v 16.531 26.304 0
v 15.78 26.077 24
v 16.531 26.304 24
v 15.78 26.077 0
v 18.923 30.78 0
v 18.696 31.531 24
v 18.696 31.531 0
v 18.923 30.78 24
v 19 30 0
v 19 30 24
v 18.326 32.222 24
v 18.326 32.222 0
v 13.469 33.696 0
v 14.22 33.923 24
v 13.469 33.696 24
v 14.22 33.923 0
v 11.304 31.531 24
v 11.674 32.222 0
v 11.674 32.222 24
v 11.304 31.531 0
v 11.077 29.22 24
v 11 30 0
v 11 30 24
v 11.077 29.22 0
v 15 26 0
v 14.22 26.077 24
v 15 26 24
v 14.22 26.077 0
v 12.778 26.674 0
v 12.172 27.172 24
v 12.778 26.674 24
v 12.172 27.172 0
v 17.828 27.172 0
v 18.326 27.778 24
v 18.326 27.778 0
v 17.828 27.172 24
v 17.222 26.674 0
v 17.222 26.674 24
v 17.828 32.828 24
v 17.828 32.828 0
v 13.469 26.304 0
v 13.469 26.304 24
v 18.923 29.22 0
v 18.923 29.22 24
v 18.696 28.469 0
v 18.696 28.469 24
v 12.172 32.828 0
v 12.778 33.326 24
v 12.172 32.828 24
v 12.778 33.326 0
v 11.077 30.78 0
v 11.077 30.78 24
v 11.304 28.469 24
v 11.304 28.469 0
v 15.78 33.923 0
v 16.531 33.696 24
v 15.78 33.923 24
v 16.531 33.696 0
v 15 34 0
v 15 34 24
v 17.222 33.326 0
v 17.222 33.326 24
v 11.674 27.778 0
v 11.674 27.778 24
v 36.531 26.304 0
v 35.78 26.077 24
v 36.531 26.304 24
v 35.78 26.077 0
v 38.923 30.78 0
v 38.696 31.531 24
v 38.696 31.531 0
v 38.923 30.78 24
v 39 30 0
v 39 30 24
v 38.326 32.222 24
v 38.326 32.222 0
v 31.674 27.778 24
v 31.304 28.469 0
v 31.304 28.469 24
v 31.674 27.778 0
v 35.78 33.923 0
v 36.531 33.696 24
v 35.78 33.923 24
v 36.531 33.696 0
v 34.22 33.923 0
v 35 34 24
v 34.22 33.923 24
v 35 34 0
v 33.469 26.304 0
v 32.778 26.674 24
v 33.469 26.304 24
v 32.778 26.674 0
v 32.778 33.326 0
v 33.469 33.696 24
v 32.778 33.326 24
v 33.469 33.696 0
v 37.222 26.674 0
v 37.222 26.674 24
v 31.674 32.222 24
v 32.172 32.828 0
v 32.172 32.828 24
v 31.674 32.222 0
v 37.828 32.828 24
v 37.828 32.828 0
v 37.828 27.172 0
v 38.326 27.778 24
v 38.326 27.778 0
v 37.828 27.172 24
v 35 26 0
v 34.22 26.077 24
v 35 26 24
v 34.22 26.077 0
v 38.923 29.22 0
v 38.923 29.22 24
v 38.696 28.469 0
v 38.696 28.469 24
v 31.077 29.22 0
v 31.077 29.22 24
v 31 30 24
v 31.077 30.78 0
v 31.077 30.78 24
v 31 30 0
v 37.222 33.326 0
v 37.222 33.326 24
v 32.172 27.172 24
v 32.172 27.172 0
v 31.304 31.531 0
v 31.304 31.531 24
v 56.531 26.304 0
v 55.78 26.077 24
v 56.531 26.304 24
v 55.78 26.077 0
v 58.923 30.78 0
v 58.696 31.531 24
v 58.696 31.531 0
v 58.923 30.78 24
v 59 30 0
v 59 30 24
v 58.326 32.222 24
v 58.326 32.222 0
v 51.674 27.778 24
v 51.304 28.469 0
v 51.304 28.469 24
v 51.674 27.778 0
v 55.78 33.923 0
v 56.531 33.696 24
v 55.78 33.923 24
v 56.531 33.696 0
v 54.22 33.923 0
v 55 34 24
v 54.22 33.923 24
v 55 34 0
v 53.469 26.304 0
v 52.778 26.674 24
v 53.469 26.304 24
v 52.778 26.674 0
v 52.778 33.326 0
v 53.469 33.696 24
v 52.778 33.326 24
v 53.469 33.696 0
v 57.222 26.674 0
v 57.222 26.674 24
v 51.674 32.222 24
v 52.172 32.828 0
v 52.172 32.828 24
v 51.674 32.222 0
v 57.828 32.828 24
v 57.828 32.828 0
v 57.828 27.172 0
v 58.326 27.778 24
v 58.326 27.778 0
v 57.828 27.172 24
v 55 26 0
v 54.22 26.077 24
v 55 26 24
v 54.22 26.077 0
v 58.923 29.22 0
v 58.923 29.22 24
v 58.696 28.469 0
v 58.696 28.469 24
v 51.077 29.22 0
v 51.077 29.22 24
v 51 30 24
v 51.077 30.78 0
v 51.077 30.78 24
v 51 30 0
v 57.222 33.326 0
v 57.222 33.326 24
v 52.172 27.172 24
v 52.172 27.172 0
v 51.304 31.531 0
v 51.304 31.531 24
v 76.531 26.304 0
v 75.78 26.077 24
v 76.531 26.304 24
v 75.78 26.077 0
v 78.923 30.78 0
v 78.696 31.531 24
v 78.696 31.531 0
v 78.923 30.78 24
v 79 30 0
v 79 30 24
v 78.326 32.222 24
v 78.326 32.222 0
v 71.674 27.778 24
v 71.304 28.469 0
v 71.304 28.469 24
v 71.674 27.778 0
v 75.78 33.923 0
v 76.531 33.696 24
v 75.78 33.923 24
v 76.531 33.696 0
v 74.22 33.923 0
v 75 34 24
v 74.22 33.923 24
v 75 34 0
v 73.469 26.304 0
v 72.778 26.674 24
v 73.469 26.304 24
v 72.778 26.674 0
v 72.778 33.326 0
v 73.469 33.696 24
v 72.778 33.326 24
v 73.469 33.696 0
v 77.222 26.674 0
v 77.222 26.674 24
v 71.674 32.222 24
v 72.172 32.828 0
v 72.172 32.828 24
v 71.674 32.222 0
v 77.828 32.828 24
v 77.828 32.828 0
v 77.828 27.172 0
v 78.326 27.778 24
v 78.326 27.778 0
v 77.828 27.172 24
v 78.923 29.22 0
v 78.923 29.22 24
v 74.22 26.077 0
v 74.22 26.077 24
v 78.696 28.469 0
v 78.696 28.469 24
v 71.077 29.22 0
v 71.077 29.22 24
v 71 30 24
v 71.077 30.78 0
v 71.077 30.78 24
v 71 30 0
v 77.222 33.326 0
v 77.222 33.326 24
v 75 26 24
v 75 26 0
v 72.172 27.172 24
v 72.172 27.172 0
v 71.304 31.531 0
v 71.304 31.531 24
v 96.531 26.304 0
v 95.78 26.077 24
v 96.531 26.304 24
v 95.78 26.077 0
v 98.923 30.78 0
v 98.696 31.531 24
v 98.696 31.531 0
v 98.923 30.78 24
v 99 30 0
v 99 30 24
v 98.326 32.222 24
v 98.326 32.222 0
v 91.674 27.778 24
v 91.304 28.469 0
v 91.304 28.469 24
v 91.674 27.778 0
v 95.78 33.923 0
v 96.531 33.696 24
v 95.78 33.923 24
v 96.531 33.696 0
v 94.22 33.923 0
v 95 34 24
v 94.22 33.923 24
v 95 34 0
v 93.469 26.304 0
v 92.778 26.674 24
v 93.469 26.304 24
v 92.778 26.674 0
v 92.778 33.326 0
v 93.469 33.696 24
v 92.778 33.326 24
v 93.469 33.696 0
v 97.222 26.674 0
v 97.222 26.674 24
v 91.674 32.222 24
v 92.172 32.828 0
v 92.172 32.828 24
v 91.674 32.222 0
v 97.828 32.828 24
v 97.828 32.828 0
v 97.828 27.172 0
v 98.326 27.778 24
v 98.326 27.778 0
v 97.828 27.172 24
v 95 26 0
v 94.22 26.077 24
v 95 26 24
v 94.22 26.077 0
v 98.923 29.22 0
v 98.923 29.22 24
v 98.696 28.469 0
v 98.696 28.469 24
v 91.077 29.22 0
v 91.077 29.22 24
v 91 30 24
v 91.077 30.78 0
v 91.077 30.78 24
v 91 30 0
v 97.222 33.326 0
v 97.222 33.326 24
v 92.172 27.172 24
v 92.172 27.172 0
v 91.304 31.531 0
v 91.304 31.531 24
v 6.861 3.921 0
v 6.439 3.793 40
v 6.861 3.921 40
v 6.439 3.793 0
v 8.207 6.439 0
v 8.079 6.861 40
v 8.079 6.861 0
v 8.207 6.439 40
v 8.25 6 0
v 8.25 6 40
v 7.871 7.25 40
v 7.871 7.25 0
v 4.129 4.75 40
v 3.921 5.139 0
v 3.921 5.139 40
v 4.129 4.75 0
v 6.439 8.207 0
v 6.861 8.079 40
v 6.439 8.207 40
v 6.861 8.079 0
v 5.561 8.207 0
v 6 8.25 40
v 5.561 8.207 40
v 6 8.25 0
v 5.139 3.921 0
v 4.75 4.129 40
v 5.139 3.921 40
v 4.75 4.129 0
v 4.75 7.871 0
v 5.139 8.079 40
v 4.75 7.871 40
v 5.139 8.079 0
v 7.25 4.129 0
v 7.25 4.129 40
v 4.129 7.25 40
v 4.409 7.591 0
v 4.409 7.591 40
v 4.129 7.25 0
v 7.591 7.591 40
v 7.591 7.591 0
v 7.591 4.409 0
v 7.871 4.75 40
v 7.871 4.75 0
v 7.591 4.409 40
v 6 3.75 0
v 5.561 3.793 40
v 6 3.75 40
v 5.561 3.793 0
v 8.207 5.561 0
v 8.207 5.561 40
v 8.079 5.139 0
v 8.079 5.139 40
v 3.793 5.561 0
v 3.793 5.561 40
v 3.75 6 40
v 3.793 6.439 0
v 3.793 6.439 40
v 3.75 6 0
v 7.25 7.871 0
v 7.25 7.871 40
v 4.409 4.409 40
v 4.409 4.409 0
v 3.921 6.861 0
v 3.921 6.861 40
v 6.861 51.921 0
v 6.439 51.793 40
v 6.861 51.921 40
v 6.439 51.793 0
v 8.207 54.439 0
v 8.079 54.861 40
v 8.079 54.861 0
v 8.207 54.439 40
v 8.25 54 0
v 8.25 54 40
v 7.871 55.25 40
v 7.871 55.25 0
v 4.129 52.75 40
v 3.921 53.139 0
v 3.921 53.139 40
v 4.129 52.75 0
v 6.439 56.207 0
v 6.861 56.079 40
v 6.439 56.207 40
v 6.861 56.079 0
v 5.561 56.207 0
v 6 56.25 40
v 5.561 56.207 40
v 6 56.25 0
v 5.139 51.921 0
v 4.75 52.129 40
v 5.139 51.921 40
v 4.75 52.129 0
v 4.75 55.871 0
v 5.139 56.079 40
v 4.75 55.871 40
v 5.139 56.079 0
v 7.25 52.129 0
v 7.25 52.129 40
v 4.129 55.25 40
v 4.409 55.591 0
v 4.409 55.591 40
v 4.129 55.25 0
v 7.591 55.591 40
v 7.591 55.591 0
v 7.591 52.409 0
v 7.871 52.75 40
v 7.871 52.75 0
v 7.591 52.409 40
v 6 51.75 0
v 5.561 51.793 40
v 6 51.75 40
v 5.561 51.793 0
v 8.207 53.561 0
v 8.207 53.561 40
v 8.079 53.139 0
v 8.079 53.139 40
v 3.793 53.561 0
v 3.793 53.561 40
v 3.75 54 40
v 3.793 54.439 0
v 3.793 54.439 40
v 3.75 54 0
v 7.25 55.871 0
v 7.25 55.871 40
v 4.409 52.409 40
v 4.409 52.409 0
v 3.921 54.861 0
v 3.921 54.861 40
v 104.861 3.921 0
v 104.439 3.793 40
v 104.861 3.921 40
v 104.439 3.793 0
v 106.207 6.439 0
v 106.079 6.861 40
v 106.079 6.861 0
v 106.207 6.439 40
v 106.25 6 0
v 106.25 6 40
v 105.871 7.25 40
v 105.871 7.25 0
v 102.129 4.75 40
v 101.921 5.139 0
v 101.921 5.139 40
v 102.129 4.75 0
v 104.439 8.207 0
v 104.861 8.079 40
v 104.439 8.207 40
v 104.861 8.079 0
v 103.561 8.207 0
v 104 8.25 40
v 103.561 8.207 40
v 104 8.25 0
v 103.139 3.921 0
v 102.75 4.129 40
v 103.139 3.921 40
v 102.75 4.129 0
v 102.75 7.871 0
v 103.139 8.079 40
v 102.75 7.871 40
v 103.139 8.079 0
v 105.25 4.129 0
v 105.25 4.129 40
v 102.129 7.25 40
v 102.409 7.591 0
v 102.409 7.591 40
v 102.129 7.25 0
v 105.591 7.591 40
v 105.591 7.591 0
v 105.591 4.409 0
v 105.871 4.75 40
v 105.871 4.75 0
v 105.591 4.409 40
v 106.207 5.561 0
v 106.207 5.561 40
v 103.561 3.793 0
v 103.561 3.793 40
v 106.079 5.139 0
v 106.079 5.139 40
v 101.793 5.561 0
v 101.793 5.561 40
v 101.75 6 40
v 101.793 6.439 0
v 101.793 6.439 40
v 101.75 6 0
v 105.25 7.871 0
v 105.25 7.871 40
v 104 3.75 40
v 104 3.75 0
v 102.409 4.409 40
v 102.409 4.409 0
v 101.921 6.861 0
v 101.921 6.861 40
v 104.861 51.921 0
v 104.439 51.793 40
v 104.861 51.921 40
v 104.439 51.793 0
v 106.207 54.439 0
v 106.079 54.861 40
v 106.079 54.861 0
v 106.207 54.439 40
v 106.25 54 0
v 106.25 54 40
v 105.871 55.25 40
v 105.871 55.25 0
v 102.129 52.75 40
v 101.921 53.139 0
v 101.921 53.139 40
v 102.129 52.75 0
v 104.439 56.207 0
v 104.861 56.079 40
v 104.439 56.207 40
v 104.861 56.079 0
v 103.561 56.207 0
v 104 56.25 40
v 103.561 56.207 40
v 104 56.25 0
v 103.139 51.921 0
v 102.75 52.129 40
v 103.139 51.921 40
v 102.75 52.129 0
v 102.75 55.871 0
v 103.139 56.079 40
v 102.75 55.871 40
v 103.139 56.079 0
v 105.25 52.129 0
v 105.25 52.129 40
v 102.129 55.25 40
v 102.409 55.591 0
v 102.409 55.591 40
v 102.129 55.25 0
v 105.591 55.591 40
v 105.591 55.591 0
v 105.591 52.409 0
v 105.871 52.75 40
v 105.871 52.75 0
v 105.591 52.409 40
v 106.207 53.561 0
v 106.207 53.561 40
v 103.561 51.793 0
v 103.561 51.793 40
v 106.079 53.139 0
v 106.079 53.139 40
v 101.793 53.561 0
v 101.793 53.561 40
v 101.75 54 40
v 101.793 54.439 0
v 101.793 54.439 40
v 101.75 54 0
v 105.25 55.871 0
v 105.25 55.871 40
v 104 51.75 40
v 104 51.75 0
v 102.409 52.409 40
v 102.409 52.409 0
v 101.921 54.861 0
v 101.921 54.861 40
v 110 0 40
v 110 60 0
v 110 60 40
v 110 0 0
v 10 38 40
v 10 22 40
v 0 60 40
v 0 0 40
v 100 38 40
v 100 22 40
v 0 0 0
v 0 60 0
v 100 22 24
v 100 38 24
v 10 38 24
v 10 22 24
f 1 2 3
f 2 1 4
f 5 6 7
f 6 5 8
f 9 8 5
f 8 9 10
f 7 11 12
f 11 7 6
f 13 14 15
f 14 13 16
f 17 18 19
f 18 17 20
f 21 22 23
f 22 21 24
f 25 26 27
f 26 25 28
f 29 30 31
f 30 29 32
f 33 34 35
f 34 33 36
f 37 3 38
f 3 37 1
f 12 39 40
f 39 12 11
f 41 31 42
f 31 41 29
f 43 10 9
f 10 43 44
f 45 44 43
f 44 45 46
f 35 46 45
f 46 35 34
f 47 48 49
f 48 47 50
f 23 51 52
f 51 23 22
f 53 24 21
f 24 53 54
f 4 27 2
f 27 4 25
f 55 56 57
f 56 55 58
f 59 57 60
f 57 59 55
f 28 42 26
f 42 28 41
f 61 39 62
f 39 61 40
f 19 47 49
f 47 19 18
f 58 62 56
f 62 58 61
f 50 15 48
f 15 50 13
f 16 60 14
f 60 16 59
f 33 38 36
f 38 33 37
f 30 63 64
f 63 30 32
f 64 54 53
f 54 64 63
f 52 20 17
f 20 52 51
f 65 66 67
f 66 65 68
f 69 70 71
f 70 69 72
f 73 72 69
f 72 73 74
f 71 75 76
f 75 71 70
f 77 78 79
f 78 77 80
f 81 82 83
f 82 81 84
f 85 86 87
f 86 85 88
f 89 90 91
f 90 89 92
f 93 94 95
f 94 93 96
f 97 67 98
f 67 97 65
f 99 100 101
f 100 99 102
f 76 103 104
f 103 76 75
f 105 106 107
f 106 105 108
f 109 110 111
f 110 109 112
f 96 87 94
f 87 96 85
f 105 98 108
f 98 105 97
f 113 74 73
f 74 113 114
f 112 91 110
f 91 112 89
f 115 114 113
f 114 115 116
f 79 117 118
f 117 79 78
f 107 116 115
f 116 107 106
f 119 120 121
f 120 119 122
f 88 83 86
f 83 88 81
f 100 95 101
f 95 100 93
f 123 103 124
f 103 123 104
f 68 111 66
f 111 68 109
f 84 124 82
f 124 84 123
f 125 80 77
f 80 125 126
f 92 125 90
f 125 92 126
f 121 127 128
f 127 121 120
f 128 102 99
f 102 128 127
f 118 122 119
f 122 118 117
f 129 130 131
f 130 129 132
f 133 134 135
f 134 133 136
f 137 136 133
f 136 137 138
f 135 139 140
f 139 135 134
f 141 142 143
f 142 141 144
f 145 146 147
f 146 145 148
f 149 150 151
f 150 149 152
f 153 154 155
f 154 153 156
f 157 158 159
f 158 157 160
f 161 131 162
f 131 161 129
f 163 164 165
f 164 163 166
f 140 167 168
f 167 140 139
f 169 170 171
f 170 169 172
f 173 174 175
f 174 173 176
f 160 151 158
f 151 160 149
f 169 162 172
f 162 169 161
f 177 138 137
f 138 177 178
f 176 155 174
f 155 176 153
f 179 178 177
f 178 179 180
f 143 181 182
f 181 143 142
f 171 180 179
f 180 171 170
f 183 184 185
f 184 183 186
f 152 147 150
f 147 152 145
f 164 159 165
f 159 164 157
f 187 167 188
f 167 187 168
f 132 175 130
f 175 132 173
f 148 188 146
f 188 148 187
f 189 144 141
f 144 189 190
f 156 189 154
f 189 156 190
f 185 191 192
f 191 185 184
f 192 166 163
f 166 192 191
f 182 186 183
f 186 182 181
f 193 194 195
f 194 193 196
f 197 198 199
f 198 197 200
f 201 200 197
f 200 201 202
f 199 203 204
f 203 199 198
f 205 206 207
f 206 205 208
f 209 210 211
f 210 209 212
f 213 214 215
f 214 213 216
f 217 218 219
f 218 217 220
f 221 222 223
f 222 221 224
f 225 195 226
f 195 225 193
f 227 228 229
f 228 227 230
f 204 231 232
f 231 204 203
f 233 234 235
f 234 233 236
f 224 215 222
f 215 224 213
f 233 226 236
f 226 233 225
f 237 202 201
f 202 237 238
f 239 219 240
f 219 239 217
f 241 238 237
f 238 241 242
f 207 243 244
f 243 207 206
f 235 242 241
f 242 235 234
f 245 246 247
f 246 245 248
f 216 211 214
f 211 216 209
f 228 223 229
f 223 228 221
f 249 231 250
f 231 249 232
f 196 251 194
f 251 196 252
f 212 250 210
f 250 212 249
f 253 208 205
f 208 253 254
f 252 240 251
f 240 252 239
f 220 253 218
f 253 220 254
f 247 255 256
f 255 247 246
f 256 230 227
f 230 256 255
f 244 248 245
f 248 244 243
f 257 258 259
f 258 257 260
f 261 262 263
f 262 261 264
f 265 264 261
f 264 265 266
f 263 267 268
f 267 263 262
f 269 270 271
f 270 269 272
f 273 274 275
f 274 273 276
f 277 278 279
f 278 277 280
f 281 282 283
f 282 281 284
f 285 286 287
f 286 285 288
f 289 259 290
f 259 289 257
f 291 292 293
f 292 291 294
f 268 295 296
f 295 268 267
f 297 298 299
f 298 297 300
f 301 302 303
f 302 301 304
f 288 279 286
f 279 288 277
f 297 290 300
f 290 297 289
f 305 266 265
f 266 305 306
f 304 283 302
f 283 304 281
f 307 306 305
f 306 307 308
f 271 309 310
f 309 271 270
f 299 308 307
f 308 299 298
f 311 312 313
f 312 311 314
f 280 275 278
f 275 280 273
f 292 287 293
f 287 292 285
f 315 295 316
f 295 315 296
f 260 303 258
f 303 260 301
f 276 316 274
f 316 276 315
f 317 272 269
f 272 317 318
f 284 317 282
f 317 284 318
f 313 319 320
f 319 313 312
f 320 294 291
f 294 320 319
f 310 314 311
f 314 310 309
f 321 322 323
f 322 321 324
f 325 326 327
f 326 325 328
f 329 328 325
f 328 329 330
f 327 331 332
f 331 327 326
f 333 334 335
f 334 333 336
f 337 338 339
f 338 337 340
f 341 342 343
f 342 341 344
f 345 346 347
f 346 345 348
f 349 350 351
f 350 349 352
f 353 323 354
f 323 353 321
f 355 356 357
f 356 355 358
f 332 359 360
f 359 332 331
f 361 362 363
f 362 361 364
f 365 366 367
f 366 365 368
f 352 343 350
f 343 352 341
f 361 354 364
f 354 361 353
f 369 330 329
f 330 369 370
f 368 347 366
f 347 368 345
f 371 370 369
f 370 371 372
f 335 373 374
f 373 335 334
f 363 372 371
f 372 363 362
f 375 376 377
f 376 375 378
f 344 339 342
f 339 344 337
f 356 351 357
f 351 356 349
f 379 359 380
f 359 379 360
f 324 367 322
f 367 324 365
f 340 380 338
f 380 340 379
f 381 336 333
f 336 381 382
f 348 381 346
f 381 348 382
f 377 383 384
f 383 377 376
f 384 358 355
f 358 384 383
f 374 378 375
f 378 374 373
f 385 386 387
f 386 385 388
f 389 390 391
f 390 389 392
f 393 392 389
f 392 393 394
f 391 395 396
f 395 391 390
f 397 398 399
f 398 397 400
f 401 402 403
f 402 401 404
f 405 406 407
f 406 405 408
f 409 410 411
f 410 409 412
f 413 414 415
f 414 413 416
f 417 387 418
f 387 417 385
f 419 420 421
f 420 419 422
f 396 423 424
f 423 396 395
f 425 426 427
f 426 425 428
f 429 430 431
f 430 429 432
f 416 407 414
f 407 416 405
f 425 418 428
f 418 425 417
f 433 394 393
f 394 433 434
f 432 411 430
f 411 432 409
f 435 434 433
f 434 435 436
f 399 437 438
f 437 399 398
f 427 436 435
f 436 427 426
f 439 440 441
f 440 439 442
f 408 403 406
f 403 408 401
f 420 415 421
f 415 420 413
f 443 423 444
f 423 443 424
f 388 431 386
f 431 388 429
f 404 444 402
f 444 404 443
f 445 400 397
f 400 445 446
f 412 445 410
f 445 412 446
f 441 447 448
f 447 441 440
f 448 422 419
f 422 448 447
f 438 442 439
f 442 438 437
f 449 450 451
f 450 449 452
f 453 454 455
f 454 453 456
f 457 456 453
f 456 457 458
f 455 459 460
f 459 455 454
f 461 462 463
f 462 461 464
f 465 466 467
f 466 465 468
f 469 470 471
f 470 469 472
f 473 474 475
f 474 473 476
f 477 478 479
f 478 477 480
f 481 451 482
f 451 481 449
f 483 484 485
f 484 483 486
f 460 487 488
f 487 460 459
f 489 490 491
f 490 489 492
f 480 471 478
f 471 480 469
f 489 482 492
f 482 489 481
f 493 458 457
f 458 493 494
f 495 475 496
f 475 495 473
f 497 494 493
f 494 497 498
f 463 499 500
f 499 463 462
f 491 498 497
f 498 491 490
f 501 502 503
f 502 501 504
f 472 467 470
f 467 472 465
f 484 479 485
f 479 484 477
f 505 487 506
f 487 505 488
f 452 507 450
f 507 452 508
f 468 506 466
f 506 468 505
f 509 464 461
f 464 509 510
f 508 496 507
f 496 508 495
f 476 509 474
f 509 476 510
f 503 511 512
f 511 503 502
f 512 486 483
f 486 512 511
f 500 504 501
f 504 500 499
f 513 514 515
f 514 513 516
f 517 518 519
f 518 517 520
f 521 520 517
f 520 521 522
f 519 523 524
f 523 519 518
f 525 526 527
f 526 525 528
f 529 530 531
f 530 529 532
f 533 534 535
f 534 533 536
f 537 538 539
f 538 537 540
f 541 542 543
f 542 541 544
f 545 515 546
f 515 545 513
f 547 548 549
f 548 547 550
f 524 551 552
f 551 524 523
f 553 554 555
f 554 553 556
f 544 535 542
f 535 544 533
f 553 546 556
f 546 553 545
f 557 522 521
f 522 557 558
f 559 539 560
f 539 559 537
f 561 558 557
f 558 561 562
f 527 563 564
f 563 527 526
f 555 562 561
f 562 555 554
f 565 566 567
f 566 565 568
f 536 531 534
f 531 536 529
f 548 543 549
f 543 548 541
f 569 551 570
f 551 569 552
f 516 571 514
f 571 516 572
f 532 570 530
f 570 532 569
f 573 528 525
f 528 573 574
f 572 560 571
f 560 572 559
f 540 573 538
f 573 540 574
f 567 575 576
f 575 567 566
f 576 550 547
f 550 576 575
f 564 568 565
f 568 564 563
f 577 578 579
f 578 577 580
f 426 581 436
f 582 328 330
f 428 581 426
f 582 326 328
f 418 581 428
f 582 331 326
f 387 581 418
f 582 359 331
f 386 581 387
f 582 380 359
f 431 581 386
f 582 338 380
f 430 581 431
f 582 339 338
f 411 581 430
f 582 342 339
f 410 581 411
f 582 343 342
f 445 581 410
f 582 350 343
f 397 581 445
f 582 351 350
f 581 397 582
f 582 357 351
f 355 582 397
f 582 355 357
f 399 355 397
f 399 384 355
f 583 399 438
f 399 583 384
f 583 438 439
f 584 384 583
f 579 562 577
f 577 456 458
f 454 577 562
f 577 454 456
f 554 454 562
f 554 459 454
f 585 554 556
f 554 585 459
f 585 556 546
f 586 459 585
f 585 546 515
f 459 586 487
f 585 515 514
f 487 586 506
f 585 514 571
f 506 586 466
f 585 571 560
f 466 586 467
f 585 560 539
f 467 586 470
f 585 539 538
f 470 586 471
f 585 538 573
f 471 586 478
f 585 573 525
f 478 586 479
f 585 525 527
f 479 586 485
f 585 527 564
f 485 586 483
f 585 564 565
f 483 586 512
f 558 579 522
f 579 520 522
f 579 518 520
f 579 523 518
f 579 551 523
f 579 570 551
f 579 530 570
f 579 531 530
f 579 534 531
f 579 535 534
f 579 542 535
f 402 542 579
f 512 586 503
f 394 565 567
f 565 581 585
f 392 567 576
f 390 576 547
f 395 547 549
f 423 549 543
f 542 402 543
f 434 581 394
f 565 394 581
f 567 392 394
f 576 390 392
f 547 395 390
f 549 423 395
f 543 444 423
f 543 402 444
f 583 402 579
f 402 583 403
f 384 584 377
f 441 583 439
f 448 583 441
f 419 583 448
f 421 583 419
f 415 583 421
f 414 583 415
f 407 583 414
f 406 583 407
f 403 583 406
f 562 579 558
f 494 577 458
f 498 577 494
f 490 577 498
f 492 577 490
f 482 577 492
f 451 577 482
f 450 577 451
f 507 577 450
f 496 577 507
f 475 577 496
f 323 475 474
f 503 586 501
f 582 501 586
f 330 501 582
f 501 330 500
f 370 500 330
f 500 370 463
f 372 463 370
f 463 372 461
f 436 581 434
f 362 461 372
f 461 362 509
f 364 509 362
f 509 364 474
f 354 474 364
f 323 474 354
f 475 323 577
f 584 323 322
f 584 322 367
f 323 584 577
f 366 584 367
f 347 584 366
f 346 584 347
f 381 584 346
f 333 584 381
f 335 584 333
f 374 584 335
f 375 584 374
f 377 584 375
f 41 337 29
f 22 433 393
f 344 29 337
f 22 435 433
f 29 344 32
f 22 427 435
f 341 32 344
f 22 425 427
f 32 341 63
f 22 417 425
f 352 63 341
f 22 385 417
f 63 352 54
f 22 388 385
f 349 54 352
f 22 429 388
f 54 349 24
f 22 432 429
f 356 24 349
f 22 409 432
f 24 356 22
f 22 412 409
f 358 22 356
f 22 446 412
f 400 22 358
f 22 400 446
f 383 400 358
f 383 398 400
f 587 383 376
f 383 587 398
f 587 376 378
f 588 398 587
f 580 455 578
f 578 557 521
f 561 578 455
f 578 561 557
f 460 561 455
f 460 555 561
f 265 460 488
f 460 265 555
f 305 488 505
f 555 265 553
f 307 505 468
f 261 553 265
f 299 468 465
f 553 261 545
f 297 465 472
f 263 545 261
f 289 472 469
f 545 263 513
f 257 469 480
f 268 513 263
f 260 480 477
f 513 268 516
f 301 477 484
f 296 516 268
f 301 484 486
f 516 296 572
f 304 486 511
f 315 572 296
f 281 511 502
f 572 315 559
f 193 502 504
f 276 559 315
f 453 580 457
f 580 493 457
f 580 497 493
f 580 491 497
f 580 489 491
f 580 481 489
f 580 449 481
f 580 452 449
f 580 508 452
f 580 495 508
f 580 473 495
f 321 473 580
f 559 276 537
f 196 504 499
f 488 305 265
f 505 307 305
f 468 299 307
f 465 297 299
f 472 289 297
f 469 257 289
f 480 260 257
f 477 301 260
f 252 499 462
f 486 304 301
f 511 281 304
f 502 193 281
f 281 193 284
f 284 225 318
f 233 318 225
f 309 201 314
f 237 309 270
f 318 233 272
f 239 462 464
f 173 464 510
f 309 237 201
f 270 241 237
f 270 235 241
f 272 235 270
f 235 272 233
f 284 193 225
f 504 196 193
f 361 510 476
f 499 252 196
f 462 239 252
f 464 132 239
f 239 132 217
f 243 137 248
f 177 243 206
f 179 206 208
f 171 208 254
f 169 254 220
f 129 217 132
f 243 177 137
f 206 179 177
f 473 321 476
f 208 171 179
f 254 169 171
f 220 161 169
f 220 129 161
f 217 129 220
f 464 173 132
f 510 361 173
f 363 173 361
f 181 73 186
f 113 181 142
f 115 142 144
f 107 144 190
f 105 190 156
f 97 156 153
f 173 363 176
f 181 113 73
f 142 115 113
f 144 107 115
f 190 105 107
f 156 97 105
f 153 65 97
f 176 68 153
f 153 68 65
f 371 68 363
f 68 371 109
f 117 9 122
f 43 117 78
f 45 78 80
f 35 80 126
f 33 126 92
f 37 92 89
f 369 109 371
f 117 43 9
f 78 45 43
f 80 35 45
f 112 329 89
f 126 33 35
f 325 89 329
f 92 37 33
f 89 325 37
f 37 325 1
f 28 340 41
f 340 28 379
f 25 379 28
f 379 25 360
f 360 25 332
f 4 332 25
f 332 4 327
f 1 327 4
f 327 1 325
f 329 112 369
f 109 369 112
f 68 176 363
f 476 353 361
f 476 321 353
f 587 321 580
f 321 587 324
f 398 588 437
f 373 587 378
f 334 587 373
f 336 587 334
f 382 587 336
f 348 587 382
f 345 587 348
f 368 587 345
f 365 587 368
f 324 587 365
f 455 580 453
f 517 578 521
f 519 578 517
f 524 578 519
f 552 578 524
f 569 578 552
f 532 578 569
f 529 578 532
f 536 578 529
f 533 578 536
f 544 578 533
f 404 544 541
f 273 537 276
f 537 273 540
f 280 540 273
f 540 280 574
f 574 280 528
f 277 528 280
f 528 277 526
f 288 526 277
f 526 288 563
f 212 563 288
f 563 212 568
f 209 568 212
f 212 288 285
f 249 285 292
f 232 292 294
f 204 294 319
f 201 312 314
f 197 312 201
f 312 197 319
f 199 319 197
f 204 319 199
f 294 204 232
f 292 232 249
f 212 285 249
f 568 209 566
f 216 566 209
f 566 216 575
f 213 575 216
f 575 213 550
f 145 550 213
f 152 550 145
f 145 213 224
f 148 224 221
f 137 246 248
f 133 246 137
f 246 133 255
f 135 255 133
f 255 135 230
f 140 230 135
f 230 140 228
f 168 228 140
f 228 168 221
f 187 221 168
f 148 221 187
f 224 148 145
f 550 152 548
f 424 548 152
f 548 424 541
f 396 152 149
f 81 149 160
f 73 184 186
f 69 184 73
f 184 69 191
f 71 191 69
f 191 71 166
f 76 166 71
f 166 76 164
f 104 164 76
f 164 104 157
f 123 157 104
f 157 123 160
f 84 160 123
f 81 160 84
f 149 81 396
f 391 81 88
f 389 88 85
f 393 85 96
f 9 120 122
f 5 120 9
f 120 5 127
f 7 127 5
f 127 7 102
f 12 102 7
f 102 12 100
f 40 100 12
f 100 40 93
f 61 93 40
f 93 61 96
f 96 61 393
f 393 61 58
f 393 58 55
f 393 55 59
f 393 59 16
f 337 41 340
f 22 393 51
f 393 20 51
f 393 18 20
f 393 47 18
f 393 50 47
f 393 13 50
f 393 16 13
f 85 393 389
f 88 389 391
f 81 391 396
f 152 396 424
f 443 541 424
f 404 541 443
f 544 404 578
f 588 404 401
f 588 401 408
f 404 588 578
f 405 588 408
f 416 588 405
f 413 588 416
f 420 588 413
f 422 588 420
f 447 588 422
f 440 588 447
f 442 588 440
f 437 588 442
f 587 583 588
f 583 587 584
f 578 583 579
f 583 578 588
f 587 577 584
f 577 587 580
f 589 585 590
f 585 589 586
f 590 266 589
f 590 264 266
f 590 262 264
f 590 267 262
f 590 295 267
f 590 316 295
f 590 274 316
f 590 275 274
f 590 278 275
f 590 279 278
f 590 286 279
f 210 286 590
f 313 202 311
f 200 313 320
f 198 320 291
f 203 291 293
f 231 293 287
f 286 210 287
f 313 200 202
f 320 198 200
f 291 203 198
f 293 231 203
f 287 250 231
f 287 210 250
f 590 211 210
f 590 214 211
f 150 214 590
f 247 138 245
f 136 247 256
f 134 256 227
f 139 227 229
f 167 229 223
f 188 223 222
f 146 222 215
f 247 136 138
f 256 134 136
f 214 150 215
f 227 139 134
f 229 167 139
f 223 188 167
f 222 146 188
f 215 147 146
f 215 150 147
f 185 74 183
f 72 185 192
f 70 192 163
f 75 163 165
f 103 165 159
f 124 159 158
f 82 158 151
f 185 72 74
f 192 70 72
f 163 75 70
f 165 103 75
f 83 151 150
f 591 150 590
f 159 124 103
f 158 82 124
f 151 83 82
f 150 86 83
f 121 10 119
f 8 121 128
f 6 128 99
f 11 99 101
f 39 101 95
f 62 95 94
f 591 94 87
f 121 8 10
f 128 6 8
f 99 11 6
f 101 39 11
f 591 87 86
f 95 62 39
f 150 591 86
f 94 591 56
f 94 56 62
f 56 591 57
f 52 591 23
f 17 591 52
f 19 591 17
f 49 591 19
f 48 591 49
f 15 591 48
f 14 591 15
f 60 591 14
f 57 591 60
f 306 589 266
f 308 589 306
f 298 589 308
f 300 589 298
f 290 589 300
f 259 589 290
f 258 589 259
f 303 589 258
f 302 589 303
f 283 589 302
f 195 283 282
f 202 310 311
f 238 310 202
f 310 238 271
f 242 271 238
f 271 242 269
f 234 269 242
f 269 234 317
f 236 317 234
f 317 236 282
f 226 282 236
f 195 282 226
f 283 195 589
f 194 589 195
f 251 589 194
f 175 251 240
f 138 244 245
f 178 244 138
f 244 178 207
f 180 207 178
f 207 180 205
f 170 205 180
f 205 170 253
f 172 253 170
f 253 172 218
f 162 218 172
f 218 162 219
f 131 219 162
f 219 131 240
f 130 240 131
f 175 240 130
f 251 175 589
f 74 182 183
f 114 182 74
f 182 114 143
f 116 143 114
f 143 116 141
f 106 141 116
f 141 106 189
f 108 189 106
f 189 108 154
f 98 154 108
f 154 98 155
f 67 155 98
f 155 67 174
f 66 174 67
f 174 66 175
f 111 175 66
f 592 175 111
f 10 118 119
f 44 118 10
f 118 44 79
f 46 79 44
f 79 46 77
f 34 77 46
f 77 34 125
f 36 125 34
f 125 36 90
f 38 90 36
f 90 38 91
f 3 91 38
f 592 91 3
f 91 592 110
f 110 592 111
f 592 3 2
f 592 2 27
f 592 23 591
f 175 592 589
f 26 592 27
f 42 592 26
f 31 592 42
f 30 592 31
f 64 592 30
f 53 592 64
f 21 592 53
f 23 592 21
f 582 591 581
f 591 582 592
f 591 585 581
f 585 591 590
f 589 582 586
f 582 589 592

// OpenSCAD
$fn = 32;

// ----------------------------------------------------------------------
// Manifold block: gallery_top manifold
// ----------------------------------------------------------------------

// --- parameters (mm) ---
block_l = 110;            // block length, X
block_w = 60;             // block width, Y
block_h = 40;             // block height, Z
port_d = 8;               // port bore diameter
port_pitch = 20;          // port pitch along X
gallery_d = 16;           // top gallery width, Y
gallery_depth = 16;       // gallery pocket depth
wall_p = 10;              // gallery end wall thickness, X
mnt_d = 4.5;              // mounting hole diameter
mnt_in = 6;               // mounting hole inset from the edges

n_ports = 5;  // ports in the row
port_x0 = (block_l - (n_ports - 1) * port_pitch) / 2;  // first port X

difference() {
  cube([block_l, block_w, block_h]);
  for (i = [0 : n_ports - 1])
    translate([port_x0 + i * port_pitch, block_w / 2, -1])
      cylinder(h = block_h + 2, d = port_d);
  translate([wall_p, block_w / 2 - gallery_d / 2, block_h - gallery_depth])
    cube([block_l - 2 * wall_p, gallery_d, gallery_depth + 1]);
  for (cx = [mnt_in, block_l - mnt_in])
    for (cy = [mnt_in, block_w - mnt_in])
      translate([cx, cy, -1]) cylinder(h = block_h + 2, d = mnt_d);
}
